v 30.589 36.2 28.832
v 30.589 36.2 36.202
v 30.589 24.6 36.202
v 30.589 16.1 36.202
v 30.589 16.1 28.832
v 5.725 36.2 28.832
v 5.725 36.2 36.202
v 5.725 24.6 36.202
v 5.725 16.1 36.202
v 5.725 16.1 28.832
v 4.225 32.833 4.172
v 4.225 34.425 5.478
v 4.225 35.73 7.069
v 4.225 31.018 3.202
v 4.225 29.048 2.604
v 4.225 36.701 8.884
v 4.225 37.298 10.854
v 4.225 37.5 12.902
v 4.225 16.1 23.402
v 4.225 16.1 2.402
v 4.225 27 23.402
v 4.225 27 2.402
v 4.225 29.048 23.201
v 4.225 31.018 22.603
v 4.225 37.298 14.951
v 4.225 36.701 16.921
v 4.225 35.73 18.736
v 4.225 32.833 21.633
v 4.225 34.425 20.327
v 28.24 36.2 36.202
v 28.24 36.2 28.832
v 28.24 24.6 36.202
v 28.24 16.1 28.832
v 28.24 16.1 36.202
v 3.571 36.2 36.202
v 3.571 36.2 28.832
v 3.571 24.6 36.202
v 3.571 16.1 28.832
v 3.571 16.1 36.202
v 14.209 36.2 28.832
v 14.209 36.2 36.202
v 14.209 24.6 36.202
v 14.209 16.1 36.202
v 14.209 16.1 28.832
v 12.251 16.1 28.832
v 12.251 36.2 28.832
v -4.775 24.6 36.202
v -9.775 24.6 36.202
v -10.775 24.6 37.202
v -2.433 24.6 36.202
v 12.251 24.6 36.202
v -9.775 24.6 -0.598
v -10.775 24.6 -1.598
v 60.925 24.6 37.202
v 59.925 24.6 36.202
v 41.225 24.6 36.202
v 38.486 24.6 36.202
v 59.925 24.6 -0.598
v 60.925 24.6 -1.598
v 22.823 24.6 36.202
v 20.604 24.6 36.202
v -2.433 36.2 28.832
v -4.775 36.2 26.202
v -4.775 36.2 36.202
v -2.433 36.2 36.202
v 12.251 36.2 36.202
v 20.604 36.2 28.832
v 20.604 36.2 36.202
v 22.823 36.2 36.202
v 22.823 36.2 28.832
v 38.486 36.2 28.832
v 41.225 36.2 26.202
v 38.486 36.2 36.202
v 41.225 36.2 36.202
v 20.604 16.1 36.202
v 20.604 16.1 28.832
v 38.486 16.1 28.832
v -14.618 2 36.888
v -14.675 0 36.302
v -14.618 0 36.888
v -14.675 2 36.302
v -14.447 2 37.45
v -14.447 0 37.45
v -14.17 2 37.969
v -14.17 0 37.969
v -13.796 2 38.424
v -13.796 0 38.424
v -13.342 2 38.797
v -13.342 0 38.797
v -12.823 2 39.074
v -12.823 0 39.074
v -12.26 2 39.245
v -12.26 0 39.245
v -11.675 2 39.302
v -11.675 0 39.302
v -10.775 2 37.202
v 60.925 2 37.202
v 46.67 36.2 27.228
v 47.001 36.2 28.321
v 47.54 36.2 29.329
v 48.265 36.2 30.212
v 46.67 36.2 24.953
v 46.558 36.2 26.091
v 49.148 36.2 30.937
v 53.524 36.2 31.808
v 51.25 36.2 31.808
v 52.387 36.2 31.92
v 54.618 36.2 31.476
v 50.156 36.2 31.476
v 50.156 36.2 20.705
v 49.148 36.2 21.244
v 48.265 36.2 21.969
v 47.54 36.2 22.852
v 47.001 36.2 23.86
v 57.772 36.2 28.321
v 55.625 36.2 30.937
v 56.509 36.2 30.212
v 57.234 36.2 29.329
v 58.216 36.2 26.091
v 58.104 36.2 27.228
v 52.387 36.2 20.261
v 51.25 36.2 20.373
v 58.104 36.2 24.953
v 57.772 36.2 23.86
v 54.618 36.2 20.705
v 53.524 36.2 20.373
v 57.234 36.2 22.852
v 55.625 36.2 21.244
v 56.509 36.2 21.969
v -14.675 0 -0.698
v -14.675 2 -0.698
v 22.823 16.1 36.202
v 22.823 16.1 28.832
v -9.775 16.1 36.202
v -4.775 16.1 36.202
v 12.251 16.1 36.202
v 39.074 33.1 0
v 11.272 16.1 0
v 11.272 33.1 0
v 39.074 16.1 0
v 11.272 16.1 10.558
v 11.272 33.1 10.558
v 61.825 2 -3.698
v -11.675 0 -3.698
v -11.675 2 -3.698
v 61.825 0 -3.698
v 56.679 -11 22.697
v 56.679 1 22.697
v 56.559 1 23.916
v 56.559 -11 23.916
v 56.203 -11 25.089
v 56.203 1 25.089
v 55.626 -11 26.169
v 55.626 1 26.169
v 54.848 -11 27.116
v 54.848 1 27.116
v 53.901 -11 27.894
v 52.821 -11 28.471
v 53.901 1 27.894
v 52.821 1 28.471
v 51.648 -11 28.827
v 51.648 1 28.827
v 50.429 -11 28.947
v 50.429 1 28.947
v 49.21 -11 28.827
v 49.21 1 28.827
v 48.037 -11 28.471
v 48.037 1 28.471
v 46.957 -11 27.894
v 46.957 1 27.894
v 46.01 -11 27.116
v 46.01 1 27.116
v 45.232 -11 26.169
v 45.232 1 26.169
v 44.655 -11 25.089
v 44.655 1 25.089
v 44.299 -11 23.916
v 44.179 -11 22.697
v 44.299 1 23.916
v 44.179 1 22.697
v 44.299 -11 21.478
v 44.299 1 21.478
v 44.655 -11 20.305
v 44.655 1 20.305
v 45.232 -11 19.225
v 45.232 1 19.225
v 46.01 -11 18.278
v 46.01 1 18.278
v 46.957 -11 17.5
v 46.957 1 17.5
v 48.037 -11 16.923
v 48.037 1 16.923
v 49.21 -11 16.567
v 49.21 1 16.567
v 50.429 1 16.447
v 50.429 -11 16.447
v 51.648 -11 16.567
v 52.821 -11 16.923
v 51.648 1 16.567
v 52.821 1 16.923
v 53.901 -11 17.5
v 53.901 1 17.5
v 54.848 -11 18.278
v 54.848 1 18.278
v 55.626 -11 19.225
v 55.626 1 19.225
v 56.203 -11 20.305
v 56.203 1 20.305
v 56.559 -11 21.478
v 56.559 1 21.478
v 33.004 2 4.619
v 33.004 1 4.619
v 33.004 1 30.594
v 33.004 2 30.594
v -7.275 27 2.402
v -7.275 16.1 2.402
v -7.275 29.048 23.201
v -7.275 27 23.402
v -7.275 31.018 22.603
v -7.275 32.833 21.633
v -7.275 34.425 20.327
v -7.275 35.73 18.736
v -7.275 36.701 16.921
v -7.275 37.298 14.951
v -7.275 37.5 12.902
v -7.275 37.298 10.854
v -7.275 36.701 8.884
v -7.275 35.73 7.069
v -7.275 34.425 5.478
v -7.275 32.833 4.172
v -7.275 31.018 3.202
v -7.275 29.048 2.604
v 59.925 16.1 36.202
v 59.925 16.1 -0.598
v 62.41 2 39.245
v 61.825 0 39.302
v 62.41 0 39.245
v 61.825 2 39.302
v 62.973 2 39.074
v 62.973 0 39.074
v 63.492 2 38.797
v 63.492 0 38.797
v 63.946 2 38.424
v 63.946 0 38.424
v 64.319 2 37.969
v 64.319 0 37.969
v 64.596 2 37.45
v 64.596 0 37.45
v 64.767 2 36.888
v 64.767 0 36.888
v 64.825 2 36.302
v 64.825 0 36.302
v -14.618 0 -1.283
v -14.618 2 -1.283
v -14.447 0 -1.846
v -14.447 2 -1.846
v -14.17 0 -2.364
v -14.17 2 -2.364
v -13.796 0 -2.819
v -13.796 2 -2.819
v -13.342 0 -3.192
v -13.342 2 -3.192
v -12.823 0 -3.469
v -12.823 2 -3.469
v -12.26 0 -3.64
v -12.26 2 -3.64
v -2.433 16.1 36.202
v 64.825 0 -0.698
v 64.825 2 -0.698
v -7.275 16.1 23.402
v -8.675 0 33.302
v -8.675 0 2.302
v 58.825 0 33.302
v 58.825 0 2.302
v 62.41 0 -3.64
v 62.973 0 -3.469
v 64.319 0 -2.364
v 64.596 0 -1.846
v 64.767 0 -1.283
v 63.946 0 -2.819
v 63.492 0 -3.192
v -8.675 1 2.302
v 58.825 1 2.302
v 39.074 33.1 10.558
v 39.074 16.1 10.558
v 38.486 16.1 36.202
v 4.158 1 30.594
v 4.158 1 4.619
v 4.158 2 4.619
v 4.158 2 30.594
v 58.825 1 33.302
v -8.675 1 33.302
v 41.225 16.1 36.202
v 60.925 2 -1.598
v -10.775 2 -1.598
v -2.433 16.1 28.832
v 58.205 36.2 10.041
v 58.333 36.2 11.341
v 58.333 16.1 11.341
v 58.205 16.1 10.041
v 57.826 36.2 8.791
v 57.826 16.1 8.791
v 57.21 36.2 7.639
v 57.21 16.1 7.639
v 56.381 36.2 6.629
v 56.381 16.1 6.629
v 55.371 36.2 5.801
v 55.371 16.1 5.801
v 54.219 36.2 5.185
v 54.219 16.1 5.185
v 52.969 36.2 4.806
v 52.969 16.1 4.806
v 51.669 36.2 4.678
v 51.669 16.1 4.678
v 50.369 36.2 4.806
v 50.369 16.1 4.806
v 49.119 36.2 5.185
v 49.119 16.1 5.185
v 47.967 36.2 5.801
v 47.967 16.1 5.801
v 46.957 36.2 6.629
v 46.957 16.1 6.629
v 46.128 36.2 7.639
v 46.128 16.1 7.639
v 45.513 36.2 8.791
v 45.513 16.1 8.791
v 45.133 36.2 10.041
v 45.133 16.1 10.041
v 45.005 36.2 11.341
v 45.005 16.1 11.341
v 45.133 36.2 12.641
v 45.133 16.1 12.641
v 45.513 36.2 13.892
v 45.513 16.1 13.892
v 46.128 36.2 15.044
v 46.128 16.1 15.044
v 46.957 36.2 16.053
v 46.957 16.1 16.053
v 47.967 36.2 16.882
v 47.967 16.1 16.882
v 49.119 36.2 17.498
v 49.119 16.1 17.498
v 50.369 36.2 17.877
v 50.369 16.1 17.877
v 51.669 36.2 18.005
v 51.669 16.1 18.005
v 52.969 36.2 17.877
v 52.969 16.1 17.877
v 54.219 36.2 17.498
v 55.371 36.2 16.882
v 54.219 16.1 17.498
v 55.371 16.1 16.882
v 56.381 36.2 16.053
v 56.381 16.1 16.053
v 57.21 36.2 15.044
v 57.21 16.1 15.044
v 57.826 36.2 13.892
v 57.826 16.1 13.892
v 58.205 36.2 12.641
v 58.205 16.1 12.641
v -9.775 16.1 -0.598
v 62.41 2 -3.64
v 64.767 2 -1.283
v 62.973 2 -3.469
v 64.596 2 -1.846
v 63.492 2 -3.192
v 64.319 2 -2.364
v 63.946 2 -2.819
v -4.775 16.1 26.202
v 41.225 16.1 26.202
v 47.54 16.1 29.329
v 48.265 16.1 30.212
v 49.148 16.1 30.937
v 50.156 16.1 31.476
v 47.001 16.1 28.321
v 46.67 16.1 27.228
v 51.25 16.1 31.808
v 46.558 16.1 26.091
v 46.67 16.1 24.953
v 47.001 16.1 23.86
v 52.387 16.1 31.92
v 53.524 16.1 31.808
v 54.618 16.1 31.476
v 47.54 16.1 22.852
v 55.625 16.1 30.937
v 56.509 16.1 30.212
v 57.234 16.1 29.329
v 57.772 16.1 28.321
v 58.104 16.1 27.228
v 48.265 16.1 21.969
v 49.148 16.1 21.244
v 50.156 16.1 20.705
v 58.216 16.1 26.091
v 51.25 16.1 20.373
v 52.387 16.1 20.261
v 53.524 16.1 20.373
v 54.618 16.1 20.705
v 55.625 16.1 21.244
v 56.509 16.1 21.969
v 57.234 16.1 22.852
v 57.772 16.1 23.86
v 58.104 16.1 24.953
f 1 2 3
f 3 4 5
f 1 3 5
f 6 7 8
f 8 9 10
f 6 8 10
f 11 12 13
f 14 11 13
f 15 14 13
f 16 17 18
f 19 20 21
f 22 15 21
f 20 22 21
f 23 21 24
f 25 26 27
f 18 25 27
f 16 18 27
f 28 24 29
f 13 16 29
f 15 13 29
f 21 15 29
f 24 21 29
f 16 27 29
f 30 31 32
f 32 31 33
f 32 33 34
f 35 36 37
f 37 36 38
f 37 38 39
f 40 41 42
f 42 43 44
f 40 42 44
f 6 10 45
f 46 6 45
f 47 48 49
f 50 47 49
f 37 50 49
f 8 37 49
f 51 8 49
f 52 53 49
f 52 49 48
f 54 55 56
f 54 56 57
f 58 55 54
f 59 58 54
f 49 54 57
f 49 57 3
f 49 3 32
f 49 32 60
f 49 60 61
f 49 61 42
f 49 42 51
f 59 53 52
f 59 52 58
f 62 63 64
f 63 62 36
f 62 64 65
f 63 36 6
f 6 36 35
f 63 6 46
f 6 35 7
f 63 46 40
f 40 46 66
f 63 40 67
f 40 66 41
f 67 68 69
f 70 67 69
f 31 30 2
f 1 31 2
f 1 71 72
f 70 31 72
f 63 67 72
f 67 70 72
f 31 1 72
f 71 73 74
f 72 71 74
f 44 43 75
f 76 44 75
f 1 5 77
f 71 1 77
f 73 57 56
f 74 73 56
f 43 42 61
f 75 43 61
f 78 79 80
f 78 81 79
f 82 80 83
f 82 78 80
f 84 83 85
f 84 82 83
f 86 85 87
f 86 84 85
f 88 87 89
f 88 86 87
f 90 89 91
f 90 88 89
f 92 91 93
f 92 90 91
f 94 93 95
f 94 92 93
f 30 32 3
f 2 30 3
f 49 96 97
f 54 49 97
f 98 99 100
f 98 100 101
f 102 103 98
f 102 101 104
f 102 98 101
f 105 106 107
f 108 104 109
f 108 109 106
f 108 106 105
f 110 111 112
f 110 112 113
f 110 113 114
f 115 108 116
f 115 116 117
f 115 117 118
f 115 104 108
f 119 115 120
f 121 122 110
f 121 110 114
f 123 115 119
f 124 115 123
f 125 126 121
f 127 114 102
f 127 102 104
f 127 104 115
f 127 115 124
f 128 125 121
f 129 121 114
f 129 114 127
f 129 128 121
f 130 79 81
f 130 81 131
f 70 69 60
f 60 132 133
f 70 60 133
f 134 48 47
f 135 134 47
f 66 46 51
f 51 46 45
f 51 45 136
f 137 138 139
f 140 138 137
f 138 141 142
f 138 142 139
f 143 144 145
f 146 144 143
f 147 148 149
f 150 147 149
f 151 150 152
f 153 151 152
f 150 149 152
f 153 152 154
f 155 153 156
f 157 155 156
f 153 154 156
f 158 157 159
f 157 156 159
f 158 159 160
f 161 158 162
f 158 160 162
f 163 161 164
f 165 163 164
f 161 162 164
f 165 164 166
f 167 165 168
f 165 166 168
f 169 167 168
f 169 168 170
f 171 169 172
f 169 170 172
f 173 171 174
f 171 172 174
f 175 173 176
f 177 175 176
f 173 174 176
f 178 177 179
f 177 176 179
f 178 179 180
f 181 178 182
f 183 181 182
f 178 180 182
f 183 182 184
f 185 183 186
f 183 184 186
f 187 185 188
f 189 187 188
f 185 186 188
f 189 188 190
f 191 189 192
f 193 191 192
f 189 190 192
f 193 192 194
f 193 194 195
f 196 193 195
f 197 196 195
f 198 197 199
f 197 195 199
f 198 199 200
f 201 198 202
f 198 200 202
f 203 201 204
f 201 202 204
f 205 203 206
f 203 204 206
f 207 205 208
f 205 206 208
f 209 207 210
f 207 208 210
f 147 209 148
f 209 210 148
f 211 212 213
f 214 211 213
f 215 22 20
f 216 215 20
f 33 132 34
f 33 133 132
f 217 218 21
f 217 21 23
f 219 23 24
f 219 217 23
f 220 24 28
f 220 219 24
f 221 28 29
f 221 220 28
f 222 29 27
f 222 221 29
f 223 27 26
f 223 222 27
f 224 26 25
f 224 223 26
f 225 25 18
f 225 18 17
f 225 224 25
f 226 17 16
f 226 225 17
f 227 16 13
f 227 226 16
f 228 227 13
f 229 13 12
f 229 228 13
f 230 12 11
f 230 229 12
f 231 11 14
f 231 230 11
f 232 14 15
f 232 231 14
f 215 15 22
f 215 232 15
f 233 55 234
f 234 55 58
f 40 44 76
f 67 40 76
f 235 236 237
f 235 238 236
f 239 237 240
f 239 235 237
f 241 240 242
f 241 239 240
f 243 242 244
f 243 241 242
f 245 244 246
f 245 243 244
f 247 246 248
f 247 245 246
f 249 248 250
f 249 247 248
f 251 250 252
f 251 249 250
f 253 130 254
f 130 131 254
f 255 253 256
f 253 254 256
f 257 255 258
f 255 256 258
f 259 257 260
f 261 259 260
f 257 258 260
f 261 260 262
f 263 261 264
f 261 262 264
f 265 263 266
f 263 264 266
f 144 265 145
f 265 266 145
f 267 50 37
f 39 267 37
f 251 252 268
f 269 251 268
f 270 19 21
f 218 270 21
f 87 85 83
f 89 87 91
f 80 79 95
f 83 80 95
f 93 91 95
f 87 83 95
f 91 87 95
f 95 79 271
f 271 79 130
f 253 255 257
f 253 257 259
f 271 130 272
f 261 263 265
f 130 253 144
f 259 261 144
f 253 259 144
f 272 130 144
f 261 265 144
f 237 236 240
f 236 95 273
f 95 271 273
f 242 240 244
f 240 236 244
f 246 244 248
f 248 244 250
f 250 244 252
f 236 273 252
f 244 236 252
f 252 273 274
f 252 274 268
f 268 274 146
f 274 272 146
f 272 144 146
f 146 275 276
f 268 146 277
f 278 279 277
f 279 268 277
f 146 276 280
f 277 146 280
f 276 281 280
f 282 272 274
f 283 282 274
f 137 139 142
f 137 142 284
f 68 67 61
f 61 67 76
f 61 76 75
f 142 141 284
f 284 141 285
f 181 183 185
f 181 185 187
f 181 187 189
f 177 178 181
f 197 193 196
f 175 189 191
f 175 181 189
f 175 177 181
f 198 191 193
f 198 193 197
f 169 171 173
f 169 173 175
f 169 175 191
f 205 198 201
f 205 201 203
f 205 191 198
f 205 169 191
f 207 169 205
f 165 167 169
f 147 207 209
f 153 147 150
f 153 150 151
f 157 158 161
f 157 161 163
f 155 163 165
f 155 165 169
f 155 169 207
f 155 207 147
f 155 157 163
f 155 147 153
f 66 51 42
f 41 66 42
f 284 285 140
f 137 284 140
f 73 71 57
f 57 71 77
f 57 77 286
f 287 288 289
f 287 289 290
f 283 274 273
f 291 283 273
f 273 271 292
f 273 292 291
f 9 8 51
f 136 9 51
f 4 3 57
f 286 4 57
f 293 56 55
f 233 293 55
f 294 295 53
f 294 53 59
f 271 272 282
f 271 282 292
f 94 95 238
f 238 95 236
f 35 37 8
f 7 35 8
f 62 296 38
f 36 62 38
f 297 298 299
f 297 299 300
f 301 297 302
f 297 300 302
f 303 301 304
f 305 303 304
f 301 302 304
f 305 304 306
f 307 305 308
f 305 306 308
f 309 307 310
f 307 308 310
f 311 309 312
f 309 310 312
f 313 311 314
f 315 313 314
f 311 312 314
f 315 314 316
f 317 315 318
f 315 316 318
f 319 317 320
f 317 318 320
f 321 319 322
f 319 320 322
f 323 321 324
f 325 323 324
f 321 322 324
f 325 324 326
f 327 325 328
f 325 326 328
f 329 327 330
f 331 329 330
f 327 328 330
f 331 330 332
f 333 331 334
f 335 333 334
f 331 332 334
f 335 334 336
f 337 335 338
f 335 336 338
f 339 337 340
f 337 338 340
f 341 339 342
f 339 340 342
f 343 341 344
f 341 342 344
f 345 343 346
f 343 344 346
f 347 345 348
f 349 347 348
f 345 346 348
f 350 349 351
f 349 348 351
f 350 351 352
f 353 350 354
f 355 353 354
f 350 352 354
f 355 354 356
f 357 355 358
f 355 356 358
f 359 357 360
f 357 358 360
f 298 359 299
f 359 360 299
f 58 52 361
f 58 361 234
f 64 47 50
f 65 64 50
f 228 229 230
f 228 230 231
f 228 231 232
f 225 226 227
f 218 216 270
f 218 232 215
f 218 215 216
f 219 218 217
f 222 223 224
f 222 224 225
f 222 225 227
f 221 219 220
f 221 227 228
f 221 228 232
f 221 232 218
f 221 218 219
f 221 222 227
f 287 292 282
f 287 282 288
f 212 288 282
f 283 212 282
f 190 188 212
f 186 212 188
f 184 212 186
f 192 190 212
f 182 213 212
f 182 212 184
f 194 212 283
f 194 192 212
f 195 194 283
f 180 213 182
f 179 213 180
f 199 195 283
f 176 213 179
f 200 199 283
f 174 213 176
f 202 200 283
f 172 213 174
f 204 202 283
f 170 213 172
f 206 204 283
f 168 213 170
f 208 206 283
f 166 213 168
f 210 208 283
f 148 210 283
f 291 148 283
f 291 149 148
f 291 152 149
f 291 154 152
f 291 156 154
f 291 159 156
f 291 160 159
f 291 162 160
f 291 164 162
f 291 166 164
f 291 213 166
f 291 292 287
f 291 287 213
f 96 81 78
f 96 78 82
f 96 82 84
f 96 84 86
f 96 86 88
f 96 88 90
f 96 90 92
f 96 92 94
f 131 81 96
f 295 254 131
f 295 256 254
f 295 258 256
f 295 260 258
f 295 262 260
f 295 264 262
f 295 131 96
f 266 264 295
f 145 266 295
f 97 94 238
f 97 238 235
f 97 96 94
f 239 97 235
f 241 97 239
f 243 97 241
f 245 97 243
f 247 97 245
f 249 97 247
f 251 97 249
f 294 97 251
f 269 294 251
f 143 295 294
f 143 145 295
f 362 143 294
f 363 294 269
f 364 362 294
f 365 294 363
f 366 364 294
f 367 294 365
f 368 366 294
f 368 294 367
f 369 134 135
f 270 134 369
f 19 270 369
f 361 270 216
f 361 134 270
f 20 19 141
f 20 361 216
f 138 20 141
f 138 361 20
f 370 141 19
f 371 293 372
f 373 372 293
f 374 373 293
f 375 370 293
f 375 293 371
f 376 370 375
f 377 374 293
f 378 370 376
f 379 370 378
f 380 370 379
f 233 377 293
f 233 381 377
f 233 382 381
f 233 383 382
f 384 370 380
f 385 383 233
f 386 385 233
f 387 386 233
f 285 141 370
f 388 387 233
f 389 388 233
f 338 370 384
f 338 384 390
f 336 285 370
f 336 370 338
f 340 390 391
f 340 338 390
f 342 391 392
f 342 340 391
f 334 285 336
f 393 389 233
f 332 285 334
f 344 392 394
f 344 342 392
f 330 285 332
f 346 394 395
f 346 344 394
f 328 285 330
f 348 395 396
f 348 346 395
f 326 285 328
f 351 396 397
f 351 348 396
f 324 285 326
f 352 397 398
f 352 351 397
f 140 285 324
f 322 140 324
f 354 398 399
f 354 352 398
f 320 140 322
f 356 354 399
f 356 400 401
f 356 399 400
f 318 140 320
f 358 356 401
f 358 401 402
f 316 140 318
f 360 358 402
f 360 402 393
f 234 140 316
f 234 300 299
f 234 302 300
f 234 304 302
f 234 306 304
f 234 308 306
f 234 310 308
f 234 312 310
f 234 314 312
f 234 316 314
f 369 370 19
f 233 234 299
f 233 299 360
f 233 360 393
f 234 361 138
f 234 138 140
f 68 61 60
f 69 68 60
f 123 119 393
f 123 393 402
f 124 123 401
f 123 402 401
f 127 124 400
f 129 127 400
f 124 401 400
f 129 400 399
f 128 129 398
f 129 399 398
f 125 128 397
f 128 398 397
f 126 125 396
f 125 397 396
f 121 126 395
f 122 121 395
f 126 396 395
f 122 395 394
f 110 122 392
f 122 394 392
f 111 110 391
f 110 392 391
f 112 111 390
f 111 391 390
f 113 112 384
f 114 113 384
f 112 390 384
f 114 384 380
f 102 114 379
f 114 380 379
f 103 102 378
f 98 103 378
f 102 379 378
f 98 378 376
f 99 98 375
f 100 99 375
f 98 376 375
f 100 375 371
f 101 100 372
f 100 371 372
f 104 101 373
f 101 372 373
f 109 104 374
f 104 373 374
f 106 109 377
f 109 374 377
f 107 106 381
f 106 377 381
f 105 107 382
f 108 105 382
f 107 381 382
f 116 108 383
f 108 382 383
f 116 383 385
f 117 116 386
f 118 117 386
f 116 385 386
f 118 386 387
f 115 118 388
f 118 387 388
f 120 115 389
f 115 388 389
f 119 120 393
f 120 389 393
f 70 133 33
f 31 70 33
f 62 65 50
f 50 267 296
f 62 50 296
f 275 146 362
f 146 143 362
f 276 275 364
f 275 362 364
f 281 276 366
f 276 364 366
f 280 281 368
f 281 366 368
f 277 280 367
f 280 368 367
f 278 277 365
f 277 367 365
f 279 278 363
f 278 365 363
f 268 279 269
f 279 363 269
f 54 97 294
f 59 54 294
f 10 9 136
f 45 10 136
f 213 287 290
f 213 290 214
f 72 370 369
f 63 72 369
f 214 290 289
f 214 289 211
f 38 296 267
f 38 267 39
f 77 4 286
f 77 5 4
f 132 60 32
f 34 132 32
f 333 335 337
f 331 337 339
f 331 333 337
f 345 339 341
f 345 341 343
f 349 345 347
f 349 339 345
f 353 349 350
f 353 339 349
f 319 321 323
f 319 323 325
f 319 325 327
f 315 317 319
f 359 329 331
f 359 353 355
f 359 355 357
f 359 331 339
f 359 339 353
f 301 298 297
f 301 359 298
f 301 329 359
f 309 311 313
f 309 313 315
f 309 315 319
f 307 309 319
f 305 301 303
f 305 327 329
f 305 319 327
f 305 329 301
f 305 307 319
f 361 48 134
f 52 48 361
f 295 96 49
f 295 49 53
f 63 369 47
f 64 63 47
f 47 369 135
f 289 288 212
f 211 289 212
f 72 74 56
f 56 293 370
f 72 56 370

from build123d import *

# Parameters (mm, degrees)
SKETCH1_W           = 79.5
SKETCH1_H           = 43
BOSS_EXTRUDE1_DEPTH = 2
SKETCH2_W           = 71.7
SKETCH2_H           = 38.8
BOSS_EXTRUDE2_DEPTH = 22.6
SKETCH3_W           = 69.7
SKETCH3_H           = 36.8
CUT_EXTRUDE1_DEPTH  = 8.5
BOSS_EXTRUDE3_DEPTH = 22.6
SKETCH6_W           = 67.219676188
SKETCH6_H           = 8.940869551
CUT_EXTRUDE2_DEPTH  = 22.6
SKETCH7_R           = 6.66374012
SKETCH7_R_2         = 5.829163104
BOSS_EXTRUDE4_DEPTH = 20.1
FILLET1_R           = 3
SKETCH8_W           = 27.801535977
SKETCH8_H           = 10.55826339
BOSS_EXTRUDE5_DEPTH = 17
SKETCH9_W           = 67.5
SKETCH9_H           = 31
CUT_EXTRUDE3_DEPTH  = 1
SKETCH10_W          = 28.845725121
SKETCH10_H          = 25.974204973
CUT_EXTRUDE4_DEPTH  = 1
SKETCH11_R          = 6.25
BOSS_EXTRUDE6_DEPTH = 12
BOSS_EXTRUDE7_START = 2.5
BOSS_EXTRUDE7_DEPTH = 11.5


with BuildPart() as part:
    # Sketch1 → Boss-Extrude1 (new body)
    with BuildSketch(Plane(origin=(0, 0, 0), x_dir=(1, 0, 0), z_dir=(0, 1, 0))):
        with Locations((25.074854651, -17.802325581)):
            Rectangle(SKETCH1_W, SKETCH1_H)
    extrude(amount=BOSS_EXTRUDE1_DEPTH)

    # Sketch2 → Boss-Extrude2 (add)
    with BuildSketch(Plane(origin=(0, 2, 0), x_dir=(1, 0, 0), z_dir=(0, 1, 0))):
        with Locations((25.074854651, -17.802325581)):
            Rectangle(SKETCH2_W, SKETCH2_H)
    extrude(amount=BOSS_EXTRUDE2_DEPTH)

    # Sketch3 → Cut-Extrude1 (cut)
    with BuildSketch(Plane(origin=(0, 24.6, 0), x_dir=(1, 0, 0), z_dir=(0, 1, 0))):
        with Locations((25.074854651, -17.802325581)):
            Rectangle(SKETCH3_W, SKETCH3_H)
    extrude(amount=-CUT_EXTRUDE1_DEPTH, mode=Mode.SUBTRACT)

    # Sketch5 → Boss-Extrude3 (add)
    with BuildSketch(Plane(origin=(0, 16.1, 0), x_dir=(1, 0, 0), z_dir=(0, 1, 0))):
        Polygon((41.224854651, -26.202325581), (-4.775145349, -26.202325581), (-4.775145349, -36.202325581), (-2.433003128, -36.202325581), (-2.433003128, -28.831573422), (3.571084453, -28.831573422), (3.571084453, -36.202325581), (5.724724564, -36.202325581), (5.724724564, -28.831573422), (12.250906718, -28.831573422), (12.250906718, -36.202325581), (14.208761365, -36.202325581), (14.208761365, -28.831573422), (20.604419876, -28.831573422), (20.604419876, -36.202325581), (22.823321808, -36.202325581), (22.823321808, -28.831573422), (28.240052996, -28.831573422), (28.240052996, -36.202325581), (30.589478571, -36.202325581), (30.589478571, -28.831573422), (38.486158978, -28.831573422), (38.486158978, -36.202325581), (41.224854651, -36.202325581), align=None)
    extrude(amount=BOSS_EXTRUDE3_DEPTH)

    # Sketch6 → Cut-Extrude2 (cut)
    with BuildSketch(Plane.XY.offset(37.202325581)):
        with Locations((18.972874337, 40.670434775)):
            Rectangle(SKETCH6_W, SKETCH6_H)
    extrude(amount=-CUT_EXTRUDE2_DEPTH, mode=Mode.SUBTRACT)

    # Sketch7 → Boss-Extrude4 (add)
    with BuildSketch(Plane(origin=(0, 16.1, 0), x_dir=(1, 0, 0), z_dir=(0, 1, 0))):
        with Locations((51.669046929, -11.341405249)):
            Circle(SKETCH7_R)
        with Locations((52.386926966, -26.090576917)):
            Circle(SKETCH7_R_2)
    extrude(amount=BOSS_EXTRUDE4_DEPTH)

    # Fillet1
    fillet1_edges = [part.edges().sort_by_distance(p)[0] for p in [
        (-14.675145349, 1, -3.697674419),
        (64.824854651, 1, -3.697674419),
        (64.824854651, 1, 39.302325581),
        (-14.675145349, 1, 39.302325581),
    ]]
    fillet(fillet1_edges, radius=FILLET1_R)

    # Sketch8 → Boss-Extrude5 (add)
    with BuildSketch(Plane(origin=(0, 16.1, 0), x_dir=(1, 0, 0), z_dir=(0, 1, 0))):
        with Locations((25.172747384, -5.279131695)):
            Rectangle(SKETCH8_W, SKETCH8_H)
    extrude(amount=BOSS_EXTRUDE5_DEPTH)

    # Sketch9 → Cut-Extrude3 (cut)
    with BuildSketch(Plane.XZ):
        with Locations((25.074854651, 17.802325581)):
            Rectangle(SKETCH9_W, SKETCH9_H)
    extrude(amount=-CUT_EXTRUDE3_DEPTH, mode=Mode.SUBTRACT)

    # Sketch10 → Cut-Extrude4 (cut)
    with BuildSketch(Plane.XZ.offset(-1)):
        with Locations((18.581303408, 17.606540116)):
            Rectangle(SKETCH10_W, SKETCH10_H)
    extrude(amount=-CUT_EXTRUDE4_DEPTH, mode=Mode.SUBTRACT)

    # Sketch11 → Boss-Extrude6 (add)
    with BuildSketch(Plane.XZ.offset(-1)):
        with Locations((50.42907232, 22.696962197)):
            Circle(SKETCH11_R)
    extrude(amount=BOSS_EXTRUDE6_DEPTH)

    # Sketch12 → Boss-Extrude7 (add)
    with BuildSketch(Plane(origin=(-9.775145349, 0, 0), x_dir=(0, 0, -1), z_dir=(1, 0, 0)).offset(BOSS_EXTRUDE7_START)):
        with BuildLine():
            Line((-23.402325581, 16.1), (-23.402325581, 27))
            ThreePointArc((-23.402325581, 27), (-12.902325581, 37.5), (-2.402325581, 27))
            Line((-2.402325581, 27), (-2.402325581, 16.1))
            ThreePointArc((-2.402325581, 16.1), (-12.902325581, 5.6), (-23.402325581, 16.1))
        make_face()
    extrude(amount=BOSS_EXTRUDE7_DEPTH)


solid = part.part
